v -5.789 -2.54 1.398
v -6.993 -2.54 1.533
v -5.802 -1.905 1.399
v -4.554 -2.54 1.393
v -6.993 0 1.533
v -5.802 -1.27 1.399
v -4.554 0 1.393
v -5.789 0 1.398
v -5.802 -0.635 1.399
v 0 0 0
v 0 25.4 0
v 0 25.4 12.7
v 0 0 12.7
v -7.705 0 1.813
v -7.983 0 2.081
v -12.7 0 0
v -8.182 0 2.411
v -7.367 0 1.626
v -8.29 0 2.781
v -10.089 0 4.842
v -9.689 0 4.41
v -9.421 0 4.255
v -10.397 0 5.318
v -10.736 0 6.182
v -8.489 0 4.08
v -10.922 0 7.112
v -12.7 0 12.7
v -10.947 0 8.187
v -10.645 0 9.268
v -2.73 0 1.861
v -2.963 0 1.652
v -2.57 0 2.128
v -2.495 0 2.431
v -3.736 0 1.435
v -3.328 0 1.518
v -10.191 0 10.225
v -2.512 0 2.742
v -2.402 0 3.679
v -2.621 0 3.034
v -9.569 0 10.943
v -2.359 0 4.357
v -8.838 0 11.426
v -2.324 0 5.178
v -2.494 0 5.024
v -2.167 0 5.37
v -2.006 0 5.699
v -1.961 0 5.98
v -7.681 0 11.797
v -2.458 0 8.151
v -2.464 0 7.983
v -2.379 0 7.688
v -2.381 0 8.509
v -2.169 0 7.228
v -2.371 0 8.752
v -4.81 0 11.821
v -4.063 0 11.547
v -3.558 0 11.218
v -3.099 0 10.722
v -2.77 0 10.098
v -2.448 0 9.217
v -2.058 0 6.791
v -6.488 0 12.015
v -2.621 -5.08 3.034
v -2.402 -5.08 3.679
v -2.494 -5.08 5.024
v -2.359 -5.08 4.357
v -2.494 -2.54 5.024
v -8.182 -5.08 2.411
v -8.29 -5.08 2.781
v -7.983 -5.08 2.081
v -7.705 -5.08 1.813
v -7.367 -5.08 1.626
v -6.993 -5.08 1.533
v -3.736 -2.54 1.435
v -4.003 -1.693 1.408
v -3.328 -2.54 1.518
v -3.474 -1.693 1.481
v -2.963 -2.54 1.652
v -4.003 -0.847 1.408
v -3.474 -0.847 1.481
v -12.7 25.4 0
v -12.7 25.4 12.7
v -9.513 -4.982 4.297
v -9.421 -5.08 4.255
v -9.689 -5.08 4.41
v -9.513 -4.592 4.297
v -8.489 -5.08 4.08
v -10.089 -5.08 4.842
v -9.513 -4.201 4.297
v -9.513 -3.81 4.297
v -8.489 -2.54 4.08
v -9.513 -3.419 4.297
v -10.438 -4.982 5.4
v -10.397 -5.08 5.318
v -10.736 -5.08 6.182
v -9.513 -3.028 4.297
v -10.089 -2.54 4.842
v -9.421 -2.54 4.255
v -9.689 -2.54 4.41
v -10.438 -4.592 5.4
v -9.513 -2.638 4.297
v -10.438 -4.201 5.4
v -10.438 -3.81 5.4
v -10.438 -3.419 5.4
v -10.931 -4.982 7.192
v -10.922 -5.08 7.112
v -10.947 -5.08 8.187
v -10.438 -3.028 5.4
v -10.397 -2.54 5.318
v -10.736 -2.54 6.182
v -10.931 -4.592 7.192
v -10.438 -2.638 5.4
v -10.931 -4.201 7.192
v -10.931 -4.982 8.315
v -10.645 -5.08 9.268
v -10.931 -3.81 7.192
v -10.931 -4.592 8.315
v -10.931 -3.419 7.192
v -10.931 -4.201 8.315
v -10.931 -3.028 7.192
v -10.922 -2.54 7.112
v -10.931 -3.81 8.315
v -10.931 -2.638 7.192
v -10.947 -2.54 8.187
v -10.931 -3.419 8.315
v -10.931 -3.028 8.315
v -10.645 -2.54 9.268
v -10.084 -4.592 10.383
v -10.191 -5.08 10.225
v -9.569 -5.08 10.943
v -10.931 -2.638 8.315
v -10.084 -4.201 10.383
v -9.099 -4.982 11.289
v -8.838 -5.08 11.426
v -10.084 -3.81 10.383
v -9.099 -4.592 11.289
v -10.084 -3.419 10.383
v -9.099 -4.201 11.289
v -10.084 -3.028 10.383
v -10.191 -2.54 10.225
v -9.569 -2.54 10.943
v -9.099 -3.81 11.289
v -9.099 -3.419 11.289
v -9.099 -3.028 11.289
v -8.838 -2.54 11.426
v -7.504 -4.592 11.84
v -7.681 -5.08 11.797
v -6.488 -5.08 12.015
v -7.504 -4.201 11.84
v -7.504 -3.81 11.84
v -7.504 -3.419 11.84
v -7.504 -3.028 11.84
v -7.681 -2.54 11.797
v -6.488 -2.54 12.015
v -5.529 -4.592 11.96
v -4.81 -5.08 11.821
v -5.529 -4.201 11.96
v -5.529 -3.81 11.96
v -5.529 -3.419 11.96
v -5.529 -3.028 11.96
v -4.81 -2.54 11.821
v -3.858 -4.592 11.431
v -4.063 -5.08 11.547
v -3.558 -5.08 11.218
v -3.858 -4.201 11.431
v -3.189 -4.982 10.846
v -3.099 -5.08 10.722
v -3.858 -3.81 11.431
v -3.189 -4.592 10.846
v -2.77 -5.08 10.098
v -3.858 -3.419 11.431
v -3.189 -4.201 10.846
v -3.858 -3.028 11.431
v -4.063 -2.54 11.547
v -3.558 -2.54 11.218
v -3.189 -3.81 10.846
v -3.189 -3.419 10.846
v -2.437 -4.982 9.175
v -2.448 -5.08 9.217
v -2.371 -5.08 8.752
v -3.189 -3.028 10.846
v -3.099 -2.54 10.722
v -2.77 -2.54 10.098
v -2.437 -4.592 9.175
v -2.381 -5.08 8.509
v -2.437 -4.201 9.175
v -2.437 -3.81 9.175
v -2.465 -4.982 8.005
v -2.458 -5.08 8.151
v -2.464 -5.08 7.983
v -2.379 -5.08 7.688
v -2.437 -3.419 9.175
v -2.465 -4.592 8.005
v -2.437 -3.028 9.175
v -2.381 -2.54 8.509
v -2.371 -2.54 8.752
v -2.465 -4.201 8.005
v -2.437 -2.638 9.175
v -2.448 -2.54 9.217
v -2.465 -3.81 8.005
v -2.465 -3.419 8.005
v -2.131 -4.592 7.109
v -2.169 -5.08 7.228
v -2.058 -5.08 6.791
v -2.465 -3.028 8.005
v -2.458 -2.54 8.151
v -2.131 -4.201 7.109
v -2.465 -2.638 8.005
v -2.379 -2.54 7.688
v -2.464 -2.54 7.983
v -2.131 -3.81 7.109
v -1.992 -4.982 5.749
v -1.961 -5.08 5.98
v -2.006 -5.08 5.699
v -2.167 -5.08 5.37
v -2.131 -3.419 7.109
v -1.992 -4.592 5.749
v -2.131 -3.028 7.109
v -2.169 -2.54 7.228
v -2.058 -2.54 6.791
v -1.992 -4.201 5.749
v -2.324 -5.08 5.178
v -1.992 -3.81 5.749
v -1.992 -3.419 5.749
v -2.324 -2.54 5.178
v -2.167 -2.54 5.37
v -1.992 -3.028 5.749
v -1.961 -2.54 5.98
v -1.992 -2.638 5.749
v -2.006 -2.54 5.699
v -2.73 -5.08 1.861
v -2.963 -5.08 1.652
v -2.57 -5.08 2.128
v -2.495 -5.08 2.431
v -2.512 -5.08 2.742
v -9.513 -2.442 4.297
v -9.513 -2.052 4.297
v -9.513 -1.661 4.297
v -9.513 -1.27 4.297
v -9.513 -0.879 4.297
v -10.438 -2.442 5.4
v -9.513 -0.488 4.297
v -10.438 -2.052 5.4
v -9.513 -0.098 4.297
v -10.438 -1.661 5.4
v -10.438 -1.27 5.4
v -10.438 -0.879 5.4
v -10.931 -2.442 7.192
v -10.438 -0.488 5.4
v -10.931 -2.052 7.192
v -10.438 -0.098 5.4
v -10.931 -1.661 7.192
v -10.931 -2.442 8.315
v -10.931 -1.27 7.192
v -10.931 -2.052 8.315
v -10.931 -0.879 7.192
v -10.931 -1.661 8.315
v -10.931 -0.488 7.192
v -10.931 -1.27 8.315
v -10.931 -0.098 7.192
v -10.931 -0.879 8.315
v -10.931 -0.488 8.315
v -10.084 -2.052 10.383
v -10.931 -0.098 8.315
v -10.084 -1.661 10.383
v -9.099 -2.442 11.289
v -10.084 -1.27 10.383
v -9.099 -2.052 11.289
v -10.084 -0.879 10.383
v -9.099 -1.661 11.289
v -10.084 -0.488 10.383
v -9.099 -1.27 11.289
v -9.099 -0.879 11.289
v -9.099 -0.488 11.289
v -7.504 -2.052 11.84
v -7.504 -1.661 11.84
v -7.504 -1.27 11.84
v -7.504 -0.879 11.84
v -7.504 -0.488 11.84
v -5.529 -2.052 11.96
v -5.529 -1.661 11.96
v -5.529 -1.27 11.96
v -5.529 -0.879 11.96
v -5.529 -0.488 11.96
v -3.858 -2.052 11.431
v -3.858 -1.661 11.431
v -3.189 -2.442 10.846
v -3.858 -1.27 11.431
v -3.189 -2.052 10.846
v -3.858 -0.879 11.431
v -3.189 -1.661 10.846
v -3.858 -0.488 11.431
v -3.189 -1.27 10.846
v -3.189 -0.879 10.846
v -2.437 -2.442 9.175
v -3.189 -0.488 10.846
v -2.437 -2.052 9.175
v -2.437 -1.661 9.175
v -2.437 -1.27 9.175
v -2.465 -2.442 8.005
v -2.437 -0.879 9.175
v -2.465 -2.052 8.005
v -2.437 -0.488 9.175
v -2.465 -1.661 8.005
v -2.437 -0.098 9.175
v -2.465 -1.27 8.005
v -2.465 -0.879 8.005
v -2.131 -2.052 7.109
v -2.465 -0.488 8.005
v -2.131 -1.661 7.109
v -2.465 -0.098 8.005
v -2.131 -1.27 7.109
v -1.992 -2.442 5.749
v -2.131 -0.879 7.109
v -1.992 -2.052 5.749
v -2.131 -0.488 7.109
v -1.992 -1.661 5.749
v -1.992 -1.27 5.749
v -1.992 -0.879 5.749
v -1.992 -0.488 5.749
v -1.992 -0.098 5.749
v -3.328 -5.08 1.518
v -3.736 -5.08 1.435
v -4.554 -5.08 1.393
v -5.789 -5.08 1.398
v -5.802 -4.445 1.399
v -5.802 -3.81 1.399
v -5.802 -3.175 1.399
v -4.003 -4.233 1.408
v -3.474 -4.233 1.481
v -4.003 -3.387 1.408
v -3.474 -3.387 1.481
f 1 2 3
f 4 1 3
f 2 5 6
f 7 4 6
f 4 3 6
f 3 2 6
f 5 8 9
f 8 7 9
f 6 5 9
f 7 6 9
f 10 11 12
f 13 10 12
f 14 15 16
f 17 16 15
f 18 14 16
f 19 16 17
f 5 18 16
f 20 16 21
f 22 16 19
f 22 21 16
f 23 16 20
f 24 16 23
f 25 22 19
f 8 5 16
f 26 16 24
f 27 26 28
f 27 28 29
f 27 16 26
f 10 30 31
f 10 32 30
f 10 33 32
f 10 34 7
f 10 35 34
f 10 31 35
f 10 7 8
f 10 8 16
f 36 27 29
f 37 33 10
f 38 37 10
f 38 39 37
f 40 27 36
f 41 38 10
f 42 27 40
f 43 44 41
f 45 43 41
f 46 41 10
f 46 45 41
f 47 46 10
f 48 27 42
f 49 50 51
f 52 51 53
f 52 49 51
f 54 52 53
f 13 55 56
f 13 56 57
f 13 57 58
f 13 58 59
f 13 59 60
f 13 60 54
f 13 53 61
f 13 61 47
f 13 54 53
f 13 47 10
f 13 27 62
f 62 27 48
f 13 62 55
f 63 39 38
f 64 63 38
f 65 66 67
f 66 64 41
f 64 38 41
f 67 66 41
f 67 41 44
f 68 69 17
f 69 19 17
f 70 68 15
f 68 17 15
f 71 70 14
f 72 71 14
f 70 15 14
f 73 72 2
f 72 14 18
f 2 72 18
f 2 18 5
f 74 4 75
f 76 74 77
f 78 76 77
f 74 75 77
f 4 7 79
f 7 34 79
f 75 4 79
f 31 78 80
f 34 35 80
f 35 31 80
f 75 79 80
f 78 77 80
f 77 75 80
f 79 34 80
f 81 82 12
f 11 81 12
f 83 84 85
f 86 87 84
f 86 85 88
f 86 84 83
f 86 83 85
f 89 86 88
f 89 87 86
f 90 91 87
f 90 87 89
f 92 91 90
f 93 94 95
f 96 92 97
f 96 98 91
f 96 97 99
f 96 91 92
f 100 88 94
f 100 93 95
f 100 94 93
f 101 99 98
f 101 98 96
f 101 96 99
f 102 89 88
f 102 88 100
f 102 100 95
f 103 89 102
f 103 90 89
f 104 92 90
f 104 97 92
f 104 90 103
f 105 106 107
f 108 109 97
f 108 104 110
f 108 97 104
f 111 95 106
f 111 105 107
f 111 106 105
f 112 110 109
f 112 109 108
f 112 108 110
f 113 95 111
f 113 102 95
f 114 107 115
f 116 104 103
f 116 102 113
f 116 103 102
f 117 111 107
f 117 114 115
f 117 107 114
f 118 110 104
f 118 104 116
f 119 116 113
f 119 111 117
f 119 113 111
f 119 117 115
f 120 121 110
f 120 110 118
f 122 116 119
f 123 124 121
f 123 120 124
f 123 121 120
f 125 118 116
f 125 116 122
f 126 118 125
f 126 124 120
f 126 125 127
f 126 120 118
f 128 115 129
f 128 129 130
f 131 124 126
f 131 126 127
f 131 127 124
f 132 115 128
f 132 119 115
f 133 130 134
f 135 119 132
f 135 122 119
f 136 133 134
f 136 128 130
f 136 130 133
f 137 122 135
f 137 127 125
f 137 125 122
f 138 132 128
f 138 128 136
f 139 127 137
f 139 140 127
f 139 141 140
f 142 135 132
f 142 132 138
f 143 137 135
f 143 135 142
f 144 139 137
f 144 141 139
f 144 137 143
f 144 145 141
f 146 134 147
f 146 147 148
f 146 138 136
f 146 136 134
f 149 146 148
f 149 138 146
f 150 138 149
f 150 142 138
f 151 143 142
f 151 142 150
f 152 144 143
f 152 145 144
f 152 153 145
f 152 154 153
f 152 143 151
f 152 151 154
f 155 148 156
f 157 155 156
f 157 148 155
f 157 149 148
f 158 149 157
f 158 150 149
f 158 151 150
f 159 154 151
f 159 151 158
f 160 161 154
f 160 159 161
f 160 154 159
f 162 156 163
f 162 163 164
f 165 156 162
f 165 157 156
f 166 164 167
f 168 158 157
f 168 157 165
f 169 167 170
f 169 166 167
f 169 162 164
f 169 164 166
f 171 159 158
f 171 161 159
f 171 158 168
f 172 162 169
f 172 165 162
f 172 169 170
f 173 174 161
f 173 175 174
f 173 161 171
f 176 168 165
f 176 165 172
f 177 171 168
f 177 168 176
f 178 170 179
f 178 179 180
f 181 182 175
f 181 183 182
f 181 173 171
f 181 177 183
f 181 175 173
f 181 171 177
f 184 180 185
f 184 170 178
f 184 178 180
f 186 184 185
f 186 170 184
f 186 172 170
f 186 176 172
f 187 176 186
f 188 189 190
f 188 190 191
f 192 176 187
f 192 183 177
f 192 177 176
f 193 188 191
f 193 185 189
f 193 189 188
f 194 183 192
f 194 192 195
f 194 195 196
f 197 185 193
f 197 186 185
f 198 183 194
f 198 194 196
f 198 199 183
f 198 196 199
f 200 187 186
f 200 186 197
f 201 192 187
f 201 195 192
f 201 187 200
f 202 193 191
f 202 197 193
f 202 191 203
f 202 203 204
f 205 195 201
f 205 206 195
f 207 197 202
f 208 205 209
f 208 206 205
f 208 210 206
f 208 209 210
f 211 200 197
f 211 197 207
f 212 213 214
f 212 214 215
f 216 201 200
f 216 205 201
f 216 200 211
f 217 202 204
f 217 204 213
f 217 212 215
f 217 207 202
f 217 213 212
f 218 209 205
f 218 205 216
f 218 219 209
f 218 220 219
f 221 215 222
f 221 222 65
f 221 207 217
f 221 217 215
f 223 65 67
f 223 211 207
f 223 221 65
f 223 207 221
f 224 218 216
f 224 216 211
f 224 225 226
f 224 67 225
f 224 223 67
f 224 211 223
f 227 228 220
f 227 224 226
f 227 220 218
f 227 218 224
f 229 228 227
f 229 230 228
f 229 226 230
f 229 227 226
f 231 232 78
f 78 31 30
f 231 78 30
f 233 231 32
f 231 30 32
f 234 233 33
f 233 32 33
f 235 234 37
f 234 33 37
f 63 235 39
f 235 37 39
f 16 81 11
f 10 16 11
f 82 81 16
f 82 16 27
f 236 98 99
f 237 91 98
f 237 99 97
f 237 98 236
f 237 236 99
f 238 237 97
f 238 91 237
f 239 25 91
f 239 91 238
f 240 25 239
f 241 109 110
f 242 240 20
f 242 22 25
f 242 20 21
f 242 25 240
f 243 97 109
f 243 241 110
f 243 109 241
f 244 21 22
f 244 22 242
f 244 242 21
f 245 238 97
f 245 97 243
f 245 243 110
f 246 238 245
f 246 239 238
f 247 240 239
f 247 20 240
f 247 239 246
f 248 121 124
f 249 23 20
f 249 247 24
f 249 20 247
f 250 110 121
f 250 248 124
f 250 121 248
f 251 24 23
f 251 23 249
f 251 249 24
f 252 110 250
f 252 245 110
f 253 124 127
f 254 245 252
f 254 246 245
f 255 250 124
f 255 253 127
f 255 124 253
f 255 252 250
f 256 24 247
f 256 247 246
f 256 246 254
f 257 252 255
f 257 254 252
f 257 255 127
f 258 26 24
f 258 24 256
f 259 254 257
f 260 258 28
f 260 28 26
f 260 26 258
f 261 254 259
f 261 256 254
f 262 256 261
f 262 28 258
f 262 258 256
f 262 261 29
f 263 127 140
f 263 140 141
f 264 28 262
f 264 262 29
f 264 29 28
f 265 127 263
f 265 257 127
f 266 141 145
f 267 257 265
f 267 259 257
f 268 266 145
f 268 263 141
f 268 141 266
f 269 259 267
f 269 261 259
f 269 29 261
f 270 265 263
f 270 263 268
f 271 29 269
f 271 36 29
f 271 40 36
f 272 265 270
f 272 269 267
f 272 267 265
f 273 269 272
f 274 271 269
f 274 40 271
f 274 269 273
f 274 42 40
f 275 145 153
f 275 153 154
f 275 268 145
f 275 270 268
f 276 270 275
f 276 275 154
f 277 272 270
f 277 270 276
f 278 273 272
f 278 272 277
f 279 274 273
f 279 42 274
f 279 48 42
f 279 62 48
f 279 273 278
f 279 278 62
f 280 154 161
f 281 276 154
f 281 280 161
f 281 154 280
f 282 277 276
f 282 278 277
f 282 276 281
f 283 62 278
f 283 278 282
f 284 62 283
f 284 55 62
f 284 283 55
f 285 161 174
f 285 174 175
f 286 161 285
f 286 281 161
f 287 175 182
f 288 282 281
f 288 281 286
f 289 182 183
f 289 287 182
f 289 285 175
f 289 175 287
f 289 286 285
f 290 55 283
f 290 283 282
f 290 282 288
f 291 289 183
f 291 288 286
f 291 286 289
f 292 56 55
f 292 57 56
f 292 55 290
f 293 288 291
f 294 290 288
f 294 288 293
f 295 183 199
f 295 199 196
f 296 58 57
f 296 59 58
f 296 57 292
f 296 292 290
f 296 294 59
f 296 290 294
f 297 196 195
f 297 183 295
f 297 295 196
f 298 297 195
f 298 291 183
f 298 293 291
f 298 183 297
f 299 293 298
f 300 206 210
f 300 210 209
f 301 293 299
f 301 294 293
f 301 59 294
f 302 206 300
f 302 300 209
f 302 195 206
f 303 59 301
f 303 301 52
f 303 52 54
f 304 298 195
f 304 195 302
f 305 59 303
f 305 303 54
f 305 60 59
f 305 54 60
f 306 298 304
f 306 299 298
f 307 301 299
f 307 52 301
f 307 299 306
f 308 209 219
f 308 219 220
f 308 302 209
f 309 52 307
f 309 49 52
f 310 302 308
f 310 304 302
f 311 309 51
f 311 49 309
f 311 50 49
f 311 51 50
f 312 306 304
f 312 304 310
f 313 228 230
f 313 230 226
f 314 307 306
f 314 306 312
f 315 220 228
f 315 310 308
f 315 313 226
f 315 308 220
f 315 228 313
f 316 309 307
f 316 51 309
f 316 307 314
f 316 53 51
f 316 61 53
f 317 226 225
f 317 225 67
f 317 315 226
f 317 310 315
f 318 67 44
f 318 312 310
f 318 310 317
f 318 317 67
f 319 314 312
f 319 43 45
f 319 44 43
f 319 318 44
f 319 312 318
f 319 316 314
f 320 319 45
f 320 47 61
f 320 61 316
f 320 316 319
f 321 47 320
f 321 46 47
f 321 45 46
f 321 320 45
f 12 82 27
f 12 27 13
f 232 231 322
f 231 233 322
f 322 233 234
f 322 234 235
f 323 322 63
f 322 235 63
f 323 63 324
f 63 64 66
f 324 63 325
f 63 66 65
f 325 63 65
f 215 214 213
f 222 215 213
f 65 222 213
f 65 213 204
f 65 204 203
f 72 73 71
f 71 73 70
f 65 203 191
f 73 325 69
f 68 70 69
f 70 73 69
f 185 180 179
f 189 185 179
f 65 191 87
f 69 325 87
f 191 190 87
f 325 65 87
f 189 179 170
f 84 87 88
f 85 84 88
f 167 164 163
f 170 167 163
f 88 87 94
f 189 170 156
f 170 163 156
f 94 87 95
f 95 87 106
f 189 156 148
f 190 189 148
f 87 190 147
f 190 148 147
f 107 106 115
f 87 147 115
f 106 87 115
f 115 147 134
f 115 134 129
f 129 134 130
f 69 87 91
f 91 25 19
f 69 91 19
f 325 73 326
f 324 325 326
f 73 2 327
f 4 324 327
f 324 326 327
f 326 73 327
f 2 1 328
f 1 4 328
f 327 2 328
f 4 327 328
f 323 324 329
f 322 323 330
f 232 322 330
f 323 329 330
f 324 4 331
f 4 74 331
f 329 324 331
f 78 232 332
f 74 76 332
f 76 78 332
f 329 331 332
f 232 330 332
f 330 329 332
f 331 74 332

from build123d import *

# Parameters (mm, degrees)
F1_DEPTH = 2.54
F2_W     = 12.7
F2_H     = 12.7
F3_DEPTH = 25.4
F4_DEPTH = 2.54


with BuildPart() as f1:
    # F0 (on Front) → F1 (new body)
    with BuildSketch(Plane.XZ):
        with BuildLine():
            add(Edge.make_bspline(
                [(-8.4889251739, 4.0800906718), (-8.8617452243, 4.1165242433), (-9.549455901, 4.183730275), (-10.0810170658, 4.8122186645), (-10.4700618228, 5.3779262362), (-10.8262926419, 6.3991144078), (-10.9429418219, 7.1844969718), (-11.0158871328, 8.3407116722), (-10.5779986667, 9.4478173258), (-10.1581575437, 10.4209290534), (-9.1573668092, 11.3622487088), (-8.1761791241, 11.6678550706), (-7.5111279513, 11.8459317334), (-6.4625099417, 12.0701748884), (-5.5393691163, 11.9753640587), (-4.6005069955, 11.7955720879), (-3.8407265188, 11.4680933777), (-3.1320832722, 10.8803594483), (-2.7346732068, 10.0479566696), (-2.4090732542, 9.2011874209), (-2.3291116587, 8.5094854147), (-2.5469984012, 8.0137426061), (-2.2748012377, 7.4666814795), (-2.107834182, 7.1281217867), (-1.9612856318, 6.2495087964), (-1.9460609013, 5.7588071468), (-2.1935393675, 5.2842811702), (-2.3963698919, 5.106779428), (-2.493579872, 5.0241085701)],
                knots=[0, 0, 0, 0, 0.0436388988, 0.080647197, 0.1163243001, 0.1599685366, 0.1985805295, 0.2437815472, 0.2900696198, 0.3341140143, 0.3834628802, 0.4260907995, 0.4615969161, 0.5051503739, 0.5467014878, 0.58805419, 0.62675516, 0.6669618665, 0.7079369523, 0.7487712519, 0.7837114552, 0.8141258509, 0.8457740598, 0.8729577178, 0.9125939793, 0.9430911222, 0.9732042386, 1, 1, 1, 1], degree=3))
            Line((-8.4889251739, 4.0800906718), (-8.2895318578, 2.7808693492))
            ThreePointArc((-8.2895318578, 2.7808693492), (-7.8524188889, 1.937796189), (-6.9933836584, 1.5329523007))
            add(Edge.make_bspline(
                [(-6.9933836584, 1.5329523007), (-6.8192683867, 1.4962066313), (-6.4693196837, 1.4250927188), (-5.8000507936, 1.3956691424), (-5.1380240151, 1.3831694125), (-4.7549887094, 1.377305774), (-4.5544075169, 1.3928102558)],
                knots=[0, 0, 0, 0, 0.2332566315, 0.4948800533, 0.7555934486, 1, 1, 1, 1], degree=3))
            add(Edge.make_bspline(
                [(-4.5544075169, 1.3928102558), (-3.9892874978, 1.3936850005), (-3.4668862354, 1.4183520107), (-2.9626822181, 1.6524156041)],
                knots=[0, 0, 0, 0, 1.612756759, 1.612756759, 1.612756759, 1.612756759], degree=3))
            ThreePointArc((-2.9626822181, 1.6524156041), (-2.5207832683, 2.2763871381), (-2.620615739, 3.0344429639))
            ThreePointArc((-2.620615739, 3.0344429639), (-2.3579732862, 4.0165620949), (-2.493579872, 5.0241085701))
        make_face()
    extrude(amount=F1_DEPTH)

    # F2 (on Front) → F3 (join)
    with BuildSketch(Plane.XZ):
        with Locations((-6.35, 6.35)):
            Rectangle(F2_W, F2_H)
    extrude(amount=-F3_DEPTH)

    # F4 (add): a face of the model
    f4_faces = [f1.faces().sort_by_distance(p)[0] for p in [
        (-6.2292594125, -2.54, 6.8088283334),
    ]]
    extrude(f4_faces, amount=F4_DEPTH)


solid = f1.part
